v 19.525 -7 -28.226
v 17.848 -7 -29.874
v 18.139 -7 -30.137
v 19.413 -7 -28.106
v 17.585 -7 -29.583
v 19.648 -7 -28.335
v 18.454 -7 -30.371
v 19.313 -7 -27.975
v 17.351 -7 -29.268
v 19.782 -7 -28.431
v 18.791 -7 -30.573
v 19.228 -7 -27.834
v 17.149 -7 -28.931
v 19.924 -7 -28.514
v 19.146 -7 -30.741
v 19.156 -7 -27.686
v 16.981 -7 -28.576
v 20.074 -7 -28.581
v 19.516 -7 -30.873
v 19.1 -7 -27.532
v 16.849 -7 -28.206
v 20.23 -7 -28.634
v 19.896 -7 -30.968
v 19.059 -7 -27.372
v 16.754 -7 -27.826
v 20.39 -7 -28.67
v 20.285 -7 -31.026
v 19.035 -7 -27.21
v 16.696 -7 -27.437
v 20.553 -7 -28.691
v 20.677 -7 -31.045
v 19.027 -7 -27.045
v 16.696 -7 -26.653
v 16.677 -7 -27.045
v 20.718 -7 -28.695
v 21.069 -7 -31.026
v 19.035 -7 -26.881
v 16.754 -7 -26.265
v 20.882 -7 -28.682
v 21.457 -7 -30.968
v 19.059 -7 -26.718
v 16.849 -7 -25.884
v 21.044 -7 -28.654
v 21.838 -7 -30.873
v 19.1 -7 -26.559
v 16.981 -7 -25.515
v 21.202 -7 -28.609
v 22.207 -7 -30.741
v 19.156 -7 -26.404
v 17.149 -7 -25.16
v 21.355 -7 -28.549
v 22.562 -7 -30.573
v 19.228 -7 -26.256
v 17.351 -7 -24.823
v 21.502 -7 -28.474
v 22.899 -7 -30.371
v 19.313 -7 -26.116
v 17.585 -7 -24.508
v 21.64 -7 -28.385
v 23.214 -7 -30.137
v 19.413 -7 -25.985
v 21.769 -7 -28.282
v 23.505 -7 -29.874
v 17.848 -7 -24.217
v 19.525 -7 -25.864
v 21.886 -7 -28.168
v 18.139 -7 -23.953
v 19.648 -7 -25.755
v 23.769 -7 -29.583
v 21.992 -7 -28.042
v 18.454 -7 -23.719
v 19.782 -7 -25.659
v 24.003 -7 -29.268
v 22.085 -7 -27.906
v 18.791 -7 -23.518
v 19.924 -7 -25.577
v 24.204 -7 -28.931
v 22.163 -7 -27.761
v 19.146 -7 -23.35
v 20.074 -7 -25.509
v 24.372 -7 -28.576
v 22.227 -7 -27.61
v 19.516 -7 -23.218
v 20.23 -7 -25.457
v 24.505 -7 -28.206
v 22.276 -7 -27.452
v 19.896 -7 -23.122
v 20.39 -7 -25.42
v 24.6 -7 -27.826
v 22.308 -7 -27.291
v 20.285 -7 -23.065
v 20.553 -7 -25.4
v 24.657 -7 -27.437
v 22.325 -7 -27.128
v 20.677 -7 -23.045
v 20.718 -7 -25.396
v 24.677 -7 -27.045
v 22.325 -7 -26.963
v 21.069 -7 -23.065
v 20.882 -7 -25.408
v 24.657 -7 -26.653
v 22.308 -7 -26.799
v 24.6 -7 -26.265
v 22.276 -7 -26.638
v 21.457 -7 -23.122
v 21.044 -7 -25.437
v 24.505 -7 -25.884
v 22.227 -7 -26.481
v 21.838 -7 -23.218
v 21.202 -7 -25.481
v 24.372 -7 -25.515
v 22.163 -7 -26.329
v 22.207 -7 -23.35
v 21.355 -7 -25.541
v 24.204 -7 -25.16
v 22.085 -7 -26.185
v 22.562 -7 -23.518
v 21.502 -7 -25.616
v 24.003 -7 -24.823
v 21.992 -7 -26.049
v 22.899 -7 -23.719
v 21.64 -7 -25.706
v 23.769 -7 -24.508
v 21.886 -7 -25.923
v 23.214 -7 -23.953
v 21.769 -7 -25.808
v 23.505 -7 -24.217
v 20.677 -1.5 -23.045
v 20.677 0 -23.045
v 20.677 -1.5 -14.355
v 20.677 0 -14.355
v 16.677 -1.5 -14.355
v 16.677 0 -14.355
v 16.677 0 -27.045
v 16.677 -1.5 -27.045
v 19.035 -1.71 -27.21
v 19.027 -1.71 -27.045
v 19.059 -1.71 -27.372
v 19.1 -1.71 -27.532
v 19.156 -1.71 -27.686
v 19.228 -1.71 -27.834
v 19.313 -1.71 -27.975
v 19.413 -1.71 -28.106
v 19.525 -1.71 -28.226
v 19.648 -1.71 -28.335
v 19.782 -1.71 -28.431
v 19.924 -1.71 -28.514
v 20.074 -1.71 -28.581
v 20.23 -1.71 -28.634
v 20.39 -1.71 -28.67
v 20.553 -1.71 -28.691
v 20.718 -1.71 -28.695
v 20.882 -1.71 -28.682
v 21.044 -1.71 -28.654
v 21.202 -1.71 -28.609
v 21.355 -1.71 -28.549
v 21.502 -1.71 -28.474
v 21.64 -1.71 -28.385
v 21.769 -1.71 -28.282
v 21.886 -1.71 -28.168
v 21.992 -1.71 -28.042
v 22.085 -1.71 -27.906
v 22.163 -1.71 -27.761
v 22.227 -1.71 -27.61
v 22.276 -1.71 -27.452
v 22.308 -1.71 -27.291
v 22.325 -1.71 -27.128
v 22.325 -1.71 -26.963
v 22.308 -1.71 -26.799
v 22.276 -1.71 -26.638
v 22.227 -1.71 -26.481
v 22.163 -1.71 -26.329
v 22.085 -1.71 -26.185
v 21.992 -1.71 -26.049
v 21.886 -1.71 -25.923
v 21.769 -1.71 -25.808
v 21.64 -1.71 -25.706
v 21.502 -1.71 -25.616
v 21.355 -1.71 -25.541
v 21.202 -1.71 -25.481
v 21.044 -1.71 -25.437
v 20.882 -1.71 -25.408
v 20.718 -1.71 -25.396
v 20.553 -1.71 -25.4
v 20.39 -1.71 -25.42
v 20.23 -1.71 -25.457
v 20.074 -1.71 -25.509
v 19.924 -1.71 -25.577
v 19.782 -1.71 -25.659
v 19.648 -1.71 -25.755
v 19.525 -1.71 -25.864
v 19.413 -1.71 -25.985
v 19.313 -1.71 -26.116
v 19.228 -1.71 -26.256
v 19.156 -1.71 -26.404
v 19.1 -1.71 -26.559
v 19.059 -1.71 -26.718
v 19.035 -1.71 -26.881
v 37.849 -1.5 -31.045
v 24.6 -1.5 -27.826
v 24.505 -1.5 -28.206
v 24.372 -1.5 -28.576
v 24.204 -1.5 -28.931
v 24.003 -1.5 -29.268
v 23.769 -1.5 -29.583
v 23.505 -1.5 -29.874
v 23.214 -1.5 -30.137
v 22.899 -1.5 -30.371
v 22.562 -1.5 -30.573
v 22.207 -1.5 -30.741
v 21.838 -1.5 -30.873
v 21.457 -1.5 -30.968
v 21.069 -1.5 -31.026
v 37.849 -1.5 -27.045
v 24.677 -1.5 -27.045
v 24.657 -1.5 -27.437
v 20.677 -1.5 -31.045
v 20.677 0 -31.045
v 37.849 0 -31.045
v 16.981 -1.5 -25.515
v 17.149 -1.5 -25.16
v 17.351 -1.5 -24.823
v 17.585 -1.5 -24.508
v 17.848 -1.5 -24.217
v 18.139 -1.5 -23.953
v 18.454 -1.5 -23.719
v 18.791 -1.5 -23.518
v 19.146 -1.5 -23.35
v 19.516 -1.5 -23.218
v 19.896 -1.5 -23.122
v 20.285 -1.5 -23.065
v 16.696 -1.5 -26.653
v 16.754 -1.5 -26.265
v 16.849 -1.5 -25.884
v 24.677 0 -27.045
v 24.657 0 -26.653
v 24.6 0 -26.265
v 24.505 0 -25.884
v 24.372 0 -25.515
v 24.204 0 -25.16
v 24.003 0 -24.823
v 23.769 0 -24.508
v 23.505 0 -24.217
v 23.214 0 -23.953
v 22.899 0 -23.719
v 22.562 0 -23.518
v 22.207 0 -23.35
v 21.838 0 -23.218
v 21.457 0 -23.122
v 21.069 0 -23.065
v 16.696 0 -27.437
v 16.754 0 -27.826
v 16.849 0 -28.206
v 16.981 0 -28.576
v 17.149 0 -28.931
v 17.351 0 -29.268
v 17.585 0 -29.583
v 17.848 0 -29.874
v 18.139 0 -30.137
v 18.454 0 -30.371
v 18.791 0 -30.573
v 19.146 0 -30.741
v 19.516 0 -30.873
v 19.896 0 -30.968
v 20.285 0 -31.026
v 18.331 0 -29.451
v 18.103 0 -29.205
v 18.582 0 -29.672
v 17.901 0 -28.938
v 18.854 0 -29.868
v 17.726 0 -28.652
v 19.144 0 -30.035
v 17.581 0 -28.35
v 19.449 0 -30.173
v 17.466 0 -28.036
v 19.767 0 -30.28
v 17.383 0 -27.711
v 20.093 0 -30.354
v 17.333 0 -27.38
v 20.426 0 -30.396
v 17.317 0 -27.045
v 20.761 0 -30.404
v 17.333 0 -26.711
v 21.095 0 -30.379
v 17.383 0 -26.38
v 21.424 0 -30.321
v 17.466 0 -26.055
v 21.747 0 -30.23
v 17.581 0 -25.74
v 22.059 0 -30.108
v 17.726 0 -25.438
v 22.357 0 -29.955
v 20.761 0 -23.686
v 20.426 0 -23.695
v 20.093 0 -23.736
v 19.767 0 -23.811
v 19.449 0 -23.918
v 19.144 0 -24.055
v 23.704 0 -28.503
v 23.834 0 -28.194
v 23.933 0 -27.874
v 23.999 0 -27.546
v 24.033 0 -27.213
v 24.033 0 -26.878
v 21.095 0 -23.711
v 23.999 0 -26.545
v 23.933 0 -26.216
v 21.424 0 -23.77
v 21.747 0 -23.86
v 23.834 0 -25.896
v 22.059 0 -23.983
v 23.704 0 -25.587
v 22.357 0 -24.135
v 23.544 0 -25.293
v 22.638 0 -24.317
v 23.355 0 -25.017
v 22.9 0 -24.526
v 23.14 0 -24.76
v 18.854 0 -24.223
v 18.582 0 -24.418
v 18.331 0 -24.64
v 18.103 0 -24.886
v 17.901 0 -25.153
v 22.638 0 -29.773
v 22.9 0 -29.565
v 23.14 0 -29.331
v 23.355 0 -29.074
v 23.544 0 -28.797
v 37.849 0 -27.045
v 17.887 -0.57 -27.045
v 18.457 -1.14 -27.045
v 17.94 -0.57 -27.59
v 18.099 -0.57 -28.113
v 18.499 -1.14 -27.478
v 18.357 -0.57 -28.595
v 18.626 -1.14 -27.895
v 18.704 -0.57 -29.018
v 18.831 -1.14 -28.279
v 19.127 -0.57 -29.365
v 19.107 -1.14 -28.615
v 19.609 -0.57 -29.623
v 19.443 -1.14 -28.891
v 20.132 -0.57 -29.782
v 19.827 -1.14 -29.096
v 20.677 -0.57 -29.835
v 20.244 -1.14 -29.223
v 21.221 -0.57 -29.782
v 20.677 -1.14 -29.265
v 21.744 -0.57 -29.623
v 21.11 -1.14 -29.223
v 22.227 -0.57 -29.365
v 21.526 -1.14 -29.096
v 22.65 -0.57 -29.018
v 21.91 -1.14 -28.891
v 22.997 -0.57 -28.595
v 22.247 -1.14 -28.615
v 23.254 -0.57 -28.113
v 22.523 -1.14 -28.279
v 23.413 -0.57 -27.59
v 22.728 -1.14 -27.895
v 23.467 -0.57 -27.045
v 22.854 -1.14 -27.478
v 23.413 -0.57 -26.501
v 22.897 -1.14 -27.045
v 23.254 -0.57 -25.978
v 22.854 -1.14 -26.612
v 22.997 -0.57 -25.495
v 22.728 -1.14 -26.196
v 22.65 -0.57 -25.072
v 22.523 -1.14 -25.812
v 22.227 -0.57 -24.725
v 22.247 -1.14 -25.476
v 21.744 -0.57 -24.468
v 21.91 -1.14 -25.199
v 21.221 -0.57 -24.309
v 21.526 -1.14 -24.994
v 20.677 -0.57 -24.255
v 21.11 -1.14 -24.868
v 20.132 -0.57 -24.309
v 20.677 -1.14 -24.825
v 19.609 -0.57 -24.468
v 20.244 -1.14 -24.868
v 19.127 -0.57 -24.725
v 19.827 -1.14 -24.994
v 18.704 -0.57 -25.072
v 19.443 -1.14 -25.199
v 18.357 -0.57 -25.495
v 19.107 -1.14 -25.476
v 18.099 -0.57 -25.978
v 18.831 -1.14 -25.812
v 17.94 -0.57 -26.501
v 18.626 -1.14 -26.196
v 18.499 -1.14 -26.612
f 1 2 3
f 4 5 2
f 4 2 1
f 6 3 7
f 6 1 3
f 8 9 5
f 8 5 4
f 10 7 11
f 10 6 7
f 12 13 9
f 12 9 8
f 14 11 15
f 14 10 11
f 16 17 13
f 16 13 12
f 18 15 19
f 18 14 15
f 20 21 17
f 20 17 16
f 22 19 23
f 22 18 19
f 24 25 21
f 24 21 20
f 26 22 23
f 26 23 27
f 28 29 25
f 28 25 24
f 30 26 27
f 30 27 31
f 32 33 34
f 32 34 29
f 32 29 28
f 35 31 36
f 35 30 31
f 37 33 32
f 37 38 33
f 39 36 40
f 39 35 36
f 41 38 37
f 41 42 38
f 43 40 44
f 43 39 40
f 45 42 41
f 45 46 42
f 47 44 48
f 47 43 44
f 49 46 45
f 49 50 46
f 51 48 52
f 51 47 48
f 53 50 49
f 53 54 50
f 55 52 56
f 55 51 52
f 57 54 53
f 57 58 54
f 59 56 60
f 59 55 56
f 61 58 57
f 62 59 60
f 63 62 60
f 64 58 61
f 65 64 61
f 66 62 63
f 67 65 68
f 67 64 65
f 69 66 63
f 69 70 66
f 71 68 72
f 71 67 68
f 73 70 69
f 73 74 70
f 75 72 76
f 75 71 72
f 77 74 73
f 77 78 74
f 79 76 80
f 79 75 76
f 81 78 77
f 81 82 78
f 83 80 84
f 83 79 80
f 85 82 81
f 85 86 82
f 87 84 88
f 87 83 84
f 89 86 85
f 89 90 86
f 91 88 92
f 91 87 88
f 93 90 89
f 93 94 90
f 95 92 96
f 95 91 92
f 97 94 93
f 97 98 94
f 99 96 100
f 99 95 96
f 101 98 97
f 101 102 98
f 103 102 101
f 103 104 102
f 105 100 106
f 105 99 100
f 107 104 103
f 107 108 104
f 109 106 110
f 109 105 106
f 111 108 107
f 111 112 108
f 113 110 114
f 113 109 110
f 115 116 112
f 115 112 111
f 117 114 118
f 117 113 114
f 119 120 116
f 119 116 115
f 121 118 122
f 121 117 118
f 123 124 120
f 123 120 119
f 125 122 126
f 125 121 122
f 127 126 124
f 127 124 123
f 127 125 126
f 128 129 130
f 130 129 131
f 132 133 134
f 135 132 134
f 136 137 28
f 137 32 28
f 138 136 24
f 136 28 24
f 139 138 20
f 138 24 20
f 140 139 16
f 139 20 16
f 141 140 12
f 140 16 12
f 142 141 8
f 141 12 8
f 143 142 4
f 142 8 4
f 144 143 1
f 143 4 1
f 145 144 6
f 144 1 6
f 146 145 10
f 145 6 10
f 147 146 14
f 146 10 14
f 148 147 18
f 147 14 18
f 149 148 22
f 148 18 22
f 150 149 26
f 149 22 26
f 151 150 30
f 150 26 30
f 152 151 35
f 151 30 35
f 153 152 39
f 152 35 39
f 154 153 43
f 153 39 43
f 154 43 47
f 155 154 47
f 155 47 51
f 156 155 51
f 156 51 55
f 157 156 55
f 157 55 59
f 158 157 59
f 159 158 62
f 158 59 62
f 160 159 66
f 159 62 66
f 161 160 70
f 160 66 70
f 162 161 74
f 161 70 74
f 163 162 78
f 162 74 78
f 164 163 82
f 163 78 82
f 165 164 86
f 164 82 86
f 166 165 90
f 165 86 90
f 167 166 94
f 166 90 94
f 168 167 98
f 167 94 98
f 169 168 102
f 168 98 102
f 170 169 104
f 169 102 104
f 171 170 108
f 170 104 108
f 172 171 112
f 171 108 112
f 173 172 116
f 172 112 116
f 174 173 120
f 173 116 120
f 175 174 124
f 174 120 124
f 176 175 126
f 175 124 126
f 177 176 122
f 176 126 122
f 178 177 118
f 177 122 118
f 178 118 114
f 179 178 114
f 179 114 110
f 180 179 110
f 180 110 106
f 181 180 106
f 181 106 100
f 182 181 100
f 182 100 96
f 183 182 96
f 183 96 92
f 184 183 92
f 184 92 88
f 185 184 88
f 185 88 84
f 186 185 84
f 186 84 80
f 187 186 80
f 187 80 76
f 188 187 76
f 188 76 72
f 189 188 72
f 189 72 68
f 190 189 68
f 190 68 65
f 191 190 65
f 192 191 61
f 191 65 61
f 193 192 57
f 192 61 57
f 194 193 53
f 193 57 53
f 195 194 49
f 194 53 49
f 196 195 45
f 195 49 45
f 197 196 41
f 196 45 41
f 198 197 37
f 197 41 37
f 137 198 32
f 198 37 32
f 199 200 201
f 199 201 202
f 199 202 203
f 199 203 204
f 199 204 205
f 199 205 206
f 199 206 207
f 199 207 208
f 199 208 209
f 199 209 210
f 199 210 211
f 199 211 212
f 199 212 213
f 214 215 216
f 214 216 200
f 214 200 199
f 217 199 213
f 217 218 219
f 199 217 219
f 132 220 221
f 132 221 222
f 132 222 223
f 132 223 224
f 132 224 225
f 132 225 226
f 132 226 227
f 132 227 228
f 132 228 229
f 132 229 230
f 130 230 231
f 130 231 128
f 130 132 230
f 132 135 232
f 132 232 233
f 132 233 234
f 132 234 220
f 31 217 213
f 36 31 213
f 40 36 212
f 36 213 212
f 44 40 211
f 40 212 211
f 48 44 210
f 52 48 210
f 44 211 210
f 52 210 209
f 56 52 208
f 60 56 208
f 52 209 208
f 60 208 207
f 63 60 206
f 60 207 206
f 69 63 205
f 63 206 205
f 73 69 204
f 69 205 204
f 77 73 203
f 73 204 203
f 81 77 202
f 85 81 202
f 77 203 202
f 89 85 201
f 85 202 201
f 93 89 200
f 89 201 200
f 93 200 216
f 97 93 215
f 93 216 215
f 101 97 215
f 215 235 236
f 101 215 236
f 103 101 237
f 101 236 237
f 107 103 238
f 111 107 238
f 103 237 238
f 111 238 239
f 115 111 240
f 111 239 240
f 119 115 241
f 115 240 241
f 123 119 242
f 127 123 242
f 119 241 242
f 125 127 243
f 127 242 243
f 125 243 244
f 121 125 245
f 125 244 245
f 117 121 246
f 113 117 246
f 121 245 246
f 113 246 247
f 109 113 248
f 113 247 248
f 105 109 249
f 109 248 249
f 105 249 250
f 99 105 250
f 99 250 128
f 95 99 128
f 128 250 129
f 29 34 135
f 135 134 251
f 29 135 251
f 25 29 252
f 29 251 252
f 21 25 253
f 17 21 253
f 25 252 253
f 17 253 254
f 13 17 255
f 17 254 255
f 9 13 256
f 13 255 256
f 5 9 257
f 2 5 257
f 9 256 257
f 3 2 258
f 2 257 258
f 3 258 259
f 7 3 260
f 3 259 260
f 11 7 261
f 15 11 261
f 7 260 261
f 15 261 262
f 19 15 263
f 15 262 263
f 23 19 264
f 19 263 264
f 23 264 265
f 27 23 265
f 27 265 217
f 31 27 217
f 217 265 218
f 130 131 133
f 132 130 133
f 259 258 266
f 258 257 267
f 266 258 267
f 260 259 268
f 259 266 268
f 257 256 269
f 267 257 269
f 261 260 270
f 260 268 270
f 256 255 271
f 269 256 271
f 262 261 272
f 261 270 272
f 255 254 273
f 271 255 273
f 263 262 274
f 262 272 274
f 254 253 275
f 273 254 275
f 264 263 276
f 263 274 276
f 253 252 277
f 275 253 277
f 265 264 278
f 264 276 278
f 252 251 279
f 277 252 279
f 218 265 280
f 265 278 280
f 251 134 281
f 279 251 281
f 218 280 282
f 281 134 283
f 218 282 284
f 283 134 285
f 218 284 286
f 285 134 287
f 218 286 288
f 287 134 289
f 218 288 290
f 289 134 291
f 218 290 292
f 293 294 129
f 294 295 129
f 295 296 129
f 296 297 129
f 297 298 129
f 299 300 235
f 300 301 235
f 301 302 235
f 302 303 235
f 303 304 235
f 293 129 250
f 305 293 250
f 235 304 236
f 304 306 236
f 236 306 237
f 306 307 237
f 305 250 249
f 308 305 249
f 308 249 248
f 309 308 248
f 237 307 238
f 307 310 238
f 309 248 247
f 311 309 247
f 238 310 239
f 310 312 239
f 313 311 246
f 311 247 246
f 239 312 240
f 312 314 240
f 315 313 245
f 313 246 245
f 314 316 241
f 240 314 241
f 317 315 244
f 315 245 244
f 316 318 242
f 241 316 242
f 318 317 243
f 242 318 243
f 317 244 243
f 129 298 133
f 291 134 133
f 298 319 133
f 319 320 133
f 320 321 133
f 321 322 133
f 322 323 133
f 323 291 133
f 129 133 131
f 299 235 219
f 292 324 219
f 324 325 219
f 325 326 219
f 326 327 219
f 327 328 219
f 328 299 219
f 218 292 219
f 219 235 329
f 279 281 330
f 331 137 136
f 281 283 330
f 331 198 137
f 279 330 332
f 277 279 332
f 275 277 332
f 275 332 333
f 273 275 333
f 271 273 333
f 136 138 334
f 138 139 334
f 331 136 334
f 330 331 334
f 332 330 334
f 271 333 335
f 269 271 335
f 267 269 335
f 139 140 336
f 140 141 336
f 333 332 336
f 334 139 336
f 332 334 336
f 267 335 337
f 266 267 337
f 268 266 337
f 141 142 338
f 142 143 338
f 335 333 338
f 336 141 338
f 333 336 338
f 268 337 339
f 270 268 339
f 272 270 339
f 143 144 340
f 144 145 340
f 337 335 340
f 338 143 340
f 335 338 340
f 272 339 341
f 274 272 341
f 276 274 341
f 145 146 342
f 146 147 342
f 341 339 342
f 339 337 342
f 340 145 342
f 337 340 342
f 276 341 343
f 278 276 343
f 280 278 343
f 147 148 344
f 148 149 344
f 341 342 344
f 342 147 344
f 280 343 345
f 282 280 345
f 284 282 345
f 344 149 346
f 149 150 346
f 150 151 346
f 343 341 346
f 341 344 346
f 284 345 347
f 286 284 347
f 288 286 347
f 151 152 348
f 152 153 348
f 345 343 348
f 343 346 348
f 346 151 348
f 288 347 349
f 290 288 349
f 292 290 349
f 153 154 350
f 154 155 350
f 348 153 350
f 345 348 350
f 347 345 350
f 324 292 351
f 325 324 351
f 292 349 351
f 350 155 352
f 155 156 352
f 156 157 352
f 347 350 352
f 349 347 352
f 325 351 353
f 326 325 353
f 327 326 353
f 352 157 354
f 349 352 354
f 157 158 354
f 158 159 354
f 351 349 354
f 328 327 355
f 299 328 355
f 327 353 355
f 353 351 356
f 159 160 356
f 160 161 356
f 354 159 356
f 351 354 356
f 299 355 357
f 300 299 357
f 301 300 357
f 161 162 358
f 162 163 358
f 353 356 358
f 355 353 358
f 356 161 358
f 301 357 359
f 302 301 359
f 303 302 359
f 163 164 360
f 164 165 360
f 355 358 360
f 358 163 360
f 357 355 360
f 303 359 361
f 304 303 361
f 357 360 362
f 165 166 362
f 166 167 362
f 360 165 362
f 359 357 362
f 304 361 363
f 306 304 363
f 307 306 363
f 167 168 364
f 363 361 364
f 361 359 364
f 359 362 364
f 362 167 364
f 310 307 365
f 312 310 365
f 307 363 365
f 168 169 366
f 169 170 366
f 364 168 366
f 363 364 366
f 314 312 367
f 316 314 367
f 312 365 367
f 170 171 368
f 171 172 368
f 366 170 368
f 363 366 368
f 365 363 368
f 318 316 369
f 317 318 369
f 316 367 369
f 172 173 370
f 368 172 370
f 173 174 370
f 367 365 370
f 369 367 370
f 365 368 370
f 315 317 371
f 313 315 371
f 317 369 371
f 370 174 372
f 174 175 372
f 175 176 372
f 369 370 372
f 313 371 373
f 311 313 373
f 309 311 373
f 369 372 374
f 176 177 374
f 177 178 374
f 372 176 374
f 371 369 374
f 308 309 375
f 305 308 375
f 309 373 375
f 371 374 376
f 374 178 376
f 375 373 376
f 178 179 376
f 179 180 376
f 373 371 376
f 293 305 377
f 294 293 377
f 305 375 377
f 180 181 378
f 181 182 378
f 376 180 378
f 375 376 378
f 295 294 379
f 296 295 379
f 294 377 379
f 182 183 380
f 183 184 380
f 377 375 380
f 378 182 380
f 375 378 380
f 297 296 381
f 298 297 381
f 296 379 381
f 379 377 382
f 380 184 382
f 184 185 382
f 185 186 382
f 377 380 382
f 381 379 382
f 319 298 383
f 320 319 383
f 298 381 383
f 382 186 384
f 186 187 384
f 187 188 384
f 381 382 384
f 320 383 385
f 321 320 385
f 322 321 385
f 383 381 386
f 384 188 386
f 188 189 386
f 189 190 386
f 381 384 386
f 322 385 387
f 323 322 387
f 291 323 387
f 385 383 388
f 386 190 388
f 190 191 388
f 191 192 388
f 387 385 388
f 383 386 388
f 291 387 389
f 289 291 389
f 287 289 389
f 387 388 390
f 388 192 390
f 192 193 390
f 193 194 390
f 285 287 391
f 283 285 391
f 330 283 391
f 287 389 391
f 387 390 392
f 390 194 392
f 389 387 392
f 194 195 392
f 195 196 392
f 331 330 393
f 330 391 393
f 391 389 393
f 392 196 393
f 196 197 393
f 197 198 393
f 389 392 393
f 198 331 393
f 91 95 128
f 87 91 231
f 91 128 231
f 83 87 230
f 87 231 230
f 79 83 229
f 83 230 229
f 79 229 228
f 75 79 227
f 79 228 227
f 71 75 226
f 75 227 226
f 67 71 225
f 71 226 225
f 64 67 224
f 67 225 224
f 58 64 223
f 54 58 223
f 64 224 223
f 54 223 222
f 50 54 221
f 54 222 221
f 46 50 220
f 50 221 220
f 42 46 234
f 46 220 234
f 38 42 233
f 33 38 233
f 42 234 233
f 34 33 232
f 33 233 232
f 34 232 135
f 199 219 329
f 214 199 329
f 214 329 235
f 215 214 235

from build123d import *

# Parameters (mm, degrees)
F1_DEPTH       = 7
F3_D           = 3.3
F3_CSINK_D     = 6.72
F3_CSINK_ANGLE = 90
F4_DEPTH       = 1.5


with BuildPart() as f1:
    # F0 (on Front) → F1 (new body)
    with BuildSketch(Plane.XZ):
        with BuildLine():
            ThreePointArc((20.6767564522, -31.0453001757), (23.505183577, -29.8737273005), (24.6767564522, -27.0453001757))
            ThreePointArc((24.6767564522, -27.0453001757), (23.505183577, -24.216873051), (20.6767564522, -23.0453001757))
            ThreePointArc((20.6767564522, -23.0453001757), (17.8483293275, -24.216873051), (16.6767564522, -27.0453001757))
            ThreePointArc((16.6767564522, -27.0453001757), (17.8483293275, -29.8737273005), (20.6767564522, -31.0453001757))
        make_face()
    extrude(amount=F1_DEPTH)

    # F3 (through all)
    with Locations(Plane(origin=(0, 0, 0), x_dir=(1, 0, 0), z_dir=(0, 1, 0))):
        with Locations((20.6767564522, 27.0453001757)):
            CounterSinkHole(F3_D / 2, F3_CSINK_D / 2, counter_sink_angle=F3_CSINK_ANGLE)

    # F0 (on Front) → F4 (join)
    with BuildSketch(Plane.XZ):
        with BuildLine():
            ThreePointArc((16.6767564522, -27.0453001757), (17.8483293275, -24.216873051), (20.6767564522, -23.0453001757))
            Line((20.6767564522, -23.0453001757), (20.6767564522, -14.3548102902))
            Line((20.6767564522, -14.3548102902), (16.6767564522, -14.3548102902))
            Line((16.6767564522, -14.3548102902), (16.6767564522, -27.0453001757))
        make_face()
        with BuildLine():
            Line((37.8486532164, -27.0453001757), (24.6767564522, -27.0453001757))
            ThreePointArc((24.6767564522, -27.0453001757), (23.505183577, -29.8737273005), (20.6767564522, -31.0453001757))
            Line((20.6767564522, -31.0453001757), (37.8486532164, -31.0453001757))
            Line((37.8486532164, -31.0453001757), (37.8486532164, -27.0453001757))
        make_face()
    extrude(amount=F4_DEPTH)


solid = f1.part
